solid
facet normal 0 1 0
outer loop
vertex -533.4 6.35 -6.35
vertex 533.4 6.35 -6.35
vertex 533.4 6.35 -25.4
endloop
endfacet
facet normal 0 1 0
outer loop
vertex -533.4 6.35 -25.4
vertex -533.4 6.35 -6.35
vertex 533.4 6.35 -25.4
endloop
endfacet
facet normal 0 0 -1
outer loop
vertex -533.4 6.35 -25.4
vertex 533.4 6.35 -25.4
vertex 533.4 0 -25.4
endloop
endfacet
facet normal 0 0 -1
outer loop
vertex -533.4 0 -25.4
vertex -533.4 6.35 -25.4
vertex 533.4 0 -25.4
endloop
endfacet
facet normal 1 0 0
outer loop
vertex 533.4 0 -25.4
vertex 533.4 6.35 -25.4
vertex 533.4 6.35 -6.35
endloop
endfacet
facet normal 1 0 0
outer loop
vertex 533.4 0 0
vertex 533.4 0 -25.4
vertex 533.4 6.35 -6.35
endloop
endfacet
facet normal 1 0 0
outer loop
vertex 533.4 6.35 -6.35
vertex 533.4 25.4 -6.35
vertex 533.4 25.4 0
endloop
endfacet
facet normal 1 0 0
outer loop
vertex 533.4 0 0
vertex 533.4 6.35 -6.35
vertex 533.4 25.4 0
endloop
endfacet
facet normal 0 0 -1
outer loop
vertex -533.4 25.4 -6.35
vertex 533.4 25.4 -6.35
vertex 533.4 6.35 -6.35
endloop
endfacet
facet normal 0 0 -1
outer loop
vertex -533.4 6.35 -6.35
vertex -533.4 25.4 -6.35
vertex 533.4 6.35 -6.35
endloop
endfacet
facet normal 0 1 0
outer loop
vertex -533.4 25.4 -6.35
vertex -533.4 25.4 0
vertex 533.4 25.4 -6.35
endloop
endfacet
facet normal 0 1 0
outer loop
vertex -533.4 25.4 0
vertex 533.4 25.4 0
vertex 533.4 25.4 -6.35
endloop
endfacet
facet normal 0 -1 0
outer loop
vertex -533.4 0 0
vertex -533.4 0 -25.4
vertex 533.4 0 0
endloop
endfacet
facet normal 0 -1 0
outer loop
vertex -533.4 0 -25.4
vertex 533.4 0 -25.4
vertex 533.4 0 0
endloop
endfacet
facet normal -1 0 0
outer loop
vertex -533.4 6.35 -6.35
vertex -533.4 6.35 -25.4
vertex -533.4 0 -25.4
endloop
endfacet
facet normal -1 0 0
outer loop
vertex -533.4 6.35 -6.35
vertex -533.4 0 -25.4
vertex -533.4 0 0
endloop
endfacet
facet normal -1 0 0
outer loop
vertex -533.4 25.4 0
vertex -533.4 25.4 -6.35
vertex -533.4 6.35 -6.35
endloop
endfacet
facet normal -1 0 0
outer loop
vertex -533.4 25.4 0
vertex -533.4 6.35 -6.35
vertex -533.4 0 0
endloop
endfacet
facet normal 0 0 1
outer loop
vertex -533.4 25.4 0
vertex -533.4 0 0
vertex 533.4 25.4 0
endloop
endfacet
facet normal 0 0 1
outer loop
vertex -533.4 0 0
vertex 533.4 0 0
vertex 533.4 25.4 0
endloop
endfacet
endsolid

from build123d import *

# Parameters (mm, degrees)
BOSS_EXTRUDE1_DEPTH      = 533.4
BOSS_EXTRUDE1_DEPTH_BACK = 533.4


with BuildPart() as part:
    # Sketch1 → Boss-Extrude1 (new body, two sides)
    with BuildSketch(Plane(origin=(0, 0, 0), x_dir=(0, 0, -1), z_dir=(1, 0, 0))) as boss_extrude1_sk:
        Polygon((25.4, 6.35), (25.4, 0), (0, 0), (0, 25.4), (6.35, 25.4), (6.35, 6.35), align=None)
    extrude(amount=BOSS_EXTRUDE1_DEPTH)
    extrude(boss_extrude1_sk.sketch, amount=-BOSS_EXTRUDE1_DEPTH_BACK)


solid = part.part
